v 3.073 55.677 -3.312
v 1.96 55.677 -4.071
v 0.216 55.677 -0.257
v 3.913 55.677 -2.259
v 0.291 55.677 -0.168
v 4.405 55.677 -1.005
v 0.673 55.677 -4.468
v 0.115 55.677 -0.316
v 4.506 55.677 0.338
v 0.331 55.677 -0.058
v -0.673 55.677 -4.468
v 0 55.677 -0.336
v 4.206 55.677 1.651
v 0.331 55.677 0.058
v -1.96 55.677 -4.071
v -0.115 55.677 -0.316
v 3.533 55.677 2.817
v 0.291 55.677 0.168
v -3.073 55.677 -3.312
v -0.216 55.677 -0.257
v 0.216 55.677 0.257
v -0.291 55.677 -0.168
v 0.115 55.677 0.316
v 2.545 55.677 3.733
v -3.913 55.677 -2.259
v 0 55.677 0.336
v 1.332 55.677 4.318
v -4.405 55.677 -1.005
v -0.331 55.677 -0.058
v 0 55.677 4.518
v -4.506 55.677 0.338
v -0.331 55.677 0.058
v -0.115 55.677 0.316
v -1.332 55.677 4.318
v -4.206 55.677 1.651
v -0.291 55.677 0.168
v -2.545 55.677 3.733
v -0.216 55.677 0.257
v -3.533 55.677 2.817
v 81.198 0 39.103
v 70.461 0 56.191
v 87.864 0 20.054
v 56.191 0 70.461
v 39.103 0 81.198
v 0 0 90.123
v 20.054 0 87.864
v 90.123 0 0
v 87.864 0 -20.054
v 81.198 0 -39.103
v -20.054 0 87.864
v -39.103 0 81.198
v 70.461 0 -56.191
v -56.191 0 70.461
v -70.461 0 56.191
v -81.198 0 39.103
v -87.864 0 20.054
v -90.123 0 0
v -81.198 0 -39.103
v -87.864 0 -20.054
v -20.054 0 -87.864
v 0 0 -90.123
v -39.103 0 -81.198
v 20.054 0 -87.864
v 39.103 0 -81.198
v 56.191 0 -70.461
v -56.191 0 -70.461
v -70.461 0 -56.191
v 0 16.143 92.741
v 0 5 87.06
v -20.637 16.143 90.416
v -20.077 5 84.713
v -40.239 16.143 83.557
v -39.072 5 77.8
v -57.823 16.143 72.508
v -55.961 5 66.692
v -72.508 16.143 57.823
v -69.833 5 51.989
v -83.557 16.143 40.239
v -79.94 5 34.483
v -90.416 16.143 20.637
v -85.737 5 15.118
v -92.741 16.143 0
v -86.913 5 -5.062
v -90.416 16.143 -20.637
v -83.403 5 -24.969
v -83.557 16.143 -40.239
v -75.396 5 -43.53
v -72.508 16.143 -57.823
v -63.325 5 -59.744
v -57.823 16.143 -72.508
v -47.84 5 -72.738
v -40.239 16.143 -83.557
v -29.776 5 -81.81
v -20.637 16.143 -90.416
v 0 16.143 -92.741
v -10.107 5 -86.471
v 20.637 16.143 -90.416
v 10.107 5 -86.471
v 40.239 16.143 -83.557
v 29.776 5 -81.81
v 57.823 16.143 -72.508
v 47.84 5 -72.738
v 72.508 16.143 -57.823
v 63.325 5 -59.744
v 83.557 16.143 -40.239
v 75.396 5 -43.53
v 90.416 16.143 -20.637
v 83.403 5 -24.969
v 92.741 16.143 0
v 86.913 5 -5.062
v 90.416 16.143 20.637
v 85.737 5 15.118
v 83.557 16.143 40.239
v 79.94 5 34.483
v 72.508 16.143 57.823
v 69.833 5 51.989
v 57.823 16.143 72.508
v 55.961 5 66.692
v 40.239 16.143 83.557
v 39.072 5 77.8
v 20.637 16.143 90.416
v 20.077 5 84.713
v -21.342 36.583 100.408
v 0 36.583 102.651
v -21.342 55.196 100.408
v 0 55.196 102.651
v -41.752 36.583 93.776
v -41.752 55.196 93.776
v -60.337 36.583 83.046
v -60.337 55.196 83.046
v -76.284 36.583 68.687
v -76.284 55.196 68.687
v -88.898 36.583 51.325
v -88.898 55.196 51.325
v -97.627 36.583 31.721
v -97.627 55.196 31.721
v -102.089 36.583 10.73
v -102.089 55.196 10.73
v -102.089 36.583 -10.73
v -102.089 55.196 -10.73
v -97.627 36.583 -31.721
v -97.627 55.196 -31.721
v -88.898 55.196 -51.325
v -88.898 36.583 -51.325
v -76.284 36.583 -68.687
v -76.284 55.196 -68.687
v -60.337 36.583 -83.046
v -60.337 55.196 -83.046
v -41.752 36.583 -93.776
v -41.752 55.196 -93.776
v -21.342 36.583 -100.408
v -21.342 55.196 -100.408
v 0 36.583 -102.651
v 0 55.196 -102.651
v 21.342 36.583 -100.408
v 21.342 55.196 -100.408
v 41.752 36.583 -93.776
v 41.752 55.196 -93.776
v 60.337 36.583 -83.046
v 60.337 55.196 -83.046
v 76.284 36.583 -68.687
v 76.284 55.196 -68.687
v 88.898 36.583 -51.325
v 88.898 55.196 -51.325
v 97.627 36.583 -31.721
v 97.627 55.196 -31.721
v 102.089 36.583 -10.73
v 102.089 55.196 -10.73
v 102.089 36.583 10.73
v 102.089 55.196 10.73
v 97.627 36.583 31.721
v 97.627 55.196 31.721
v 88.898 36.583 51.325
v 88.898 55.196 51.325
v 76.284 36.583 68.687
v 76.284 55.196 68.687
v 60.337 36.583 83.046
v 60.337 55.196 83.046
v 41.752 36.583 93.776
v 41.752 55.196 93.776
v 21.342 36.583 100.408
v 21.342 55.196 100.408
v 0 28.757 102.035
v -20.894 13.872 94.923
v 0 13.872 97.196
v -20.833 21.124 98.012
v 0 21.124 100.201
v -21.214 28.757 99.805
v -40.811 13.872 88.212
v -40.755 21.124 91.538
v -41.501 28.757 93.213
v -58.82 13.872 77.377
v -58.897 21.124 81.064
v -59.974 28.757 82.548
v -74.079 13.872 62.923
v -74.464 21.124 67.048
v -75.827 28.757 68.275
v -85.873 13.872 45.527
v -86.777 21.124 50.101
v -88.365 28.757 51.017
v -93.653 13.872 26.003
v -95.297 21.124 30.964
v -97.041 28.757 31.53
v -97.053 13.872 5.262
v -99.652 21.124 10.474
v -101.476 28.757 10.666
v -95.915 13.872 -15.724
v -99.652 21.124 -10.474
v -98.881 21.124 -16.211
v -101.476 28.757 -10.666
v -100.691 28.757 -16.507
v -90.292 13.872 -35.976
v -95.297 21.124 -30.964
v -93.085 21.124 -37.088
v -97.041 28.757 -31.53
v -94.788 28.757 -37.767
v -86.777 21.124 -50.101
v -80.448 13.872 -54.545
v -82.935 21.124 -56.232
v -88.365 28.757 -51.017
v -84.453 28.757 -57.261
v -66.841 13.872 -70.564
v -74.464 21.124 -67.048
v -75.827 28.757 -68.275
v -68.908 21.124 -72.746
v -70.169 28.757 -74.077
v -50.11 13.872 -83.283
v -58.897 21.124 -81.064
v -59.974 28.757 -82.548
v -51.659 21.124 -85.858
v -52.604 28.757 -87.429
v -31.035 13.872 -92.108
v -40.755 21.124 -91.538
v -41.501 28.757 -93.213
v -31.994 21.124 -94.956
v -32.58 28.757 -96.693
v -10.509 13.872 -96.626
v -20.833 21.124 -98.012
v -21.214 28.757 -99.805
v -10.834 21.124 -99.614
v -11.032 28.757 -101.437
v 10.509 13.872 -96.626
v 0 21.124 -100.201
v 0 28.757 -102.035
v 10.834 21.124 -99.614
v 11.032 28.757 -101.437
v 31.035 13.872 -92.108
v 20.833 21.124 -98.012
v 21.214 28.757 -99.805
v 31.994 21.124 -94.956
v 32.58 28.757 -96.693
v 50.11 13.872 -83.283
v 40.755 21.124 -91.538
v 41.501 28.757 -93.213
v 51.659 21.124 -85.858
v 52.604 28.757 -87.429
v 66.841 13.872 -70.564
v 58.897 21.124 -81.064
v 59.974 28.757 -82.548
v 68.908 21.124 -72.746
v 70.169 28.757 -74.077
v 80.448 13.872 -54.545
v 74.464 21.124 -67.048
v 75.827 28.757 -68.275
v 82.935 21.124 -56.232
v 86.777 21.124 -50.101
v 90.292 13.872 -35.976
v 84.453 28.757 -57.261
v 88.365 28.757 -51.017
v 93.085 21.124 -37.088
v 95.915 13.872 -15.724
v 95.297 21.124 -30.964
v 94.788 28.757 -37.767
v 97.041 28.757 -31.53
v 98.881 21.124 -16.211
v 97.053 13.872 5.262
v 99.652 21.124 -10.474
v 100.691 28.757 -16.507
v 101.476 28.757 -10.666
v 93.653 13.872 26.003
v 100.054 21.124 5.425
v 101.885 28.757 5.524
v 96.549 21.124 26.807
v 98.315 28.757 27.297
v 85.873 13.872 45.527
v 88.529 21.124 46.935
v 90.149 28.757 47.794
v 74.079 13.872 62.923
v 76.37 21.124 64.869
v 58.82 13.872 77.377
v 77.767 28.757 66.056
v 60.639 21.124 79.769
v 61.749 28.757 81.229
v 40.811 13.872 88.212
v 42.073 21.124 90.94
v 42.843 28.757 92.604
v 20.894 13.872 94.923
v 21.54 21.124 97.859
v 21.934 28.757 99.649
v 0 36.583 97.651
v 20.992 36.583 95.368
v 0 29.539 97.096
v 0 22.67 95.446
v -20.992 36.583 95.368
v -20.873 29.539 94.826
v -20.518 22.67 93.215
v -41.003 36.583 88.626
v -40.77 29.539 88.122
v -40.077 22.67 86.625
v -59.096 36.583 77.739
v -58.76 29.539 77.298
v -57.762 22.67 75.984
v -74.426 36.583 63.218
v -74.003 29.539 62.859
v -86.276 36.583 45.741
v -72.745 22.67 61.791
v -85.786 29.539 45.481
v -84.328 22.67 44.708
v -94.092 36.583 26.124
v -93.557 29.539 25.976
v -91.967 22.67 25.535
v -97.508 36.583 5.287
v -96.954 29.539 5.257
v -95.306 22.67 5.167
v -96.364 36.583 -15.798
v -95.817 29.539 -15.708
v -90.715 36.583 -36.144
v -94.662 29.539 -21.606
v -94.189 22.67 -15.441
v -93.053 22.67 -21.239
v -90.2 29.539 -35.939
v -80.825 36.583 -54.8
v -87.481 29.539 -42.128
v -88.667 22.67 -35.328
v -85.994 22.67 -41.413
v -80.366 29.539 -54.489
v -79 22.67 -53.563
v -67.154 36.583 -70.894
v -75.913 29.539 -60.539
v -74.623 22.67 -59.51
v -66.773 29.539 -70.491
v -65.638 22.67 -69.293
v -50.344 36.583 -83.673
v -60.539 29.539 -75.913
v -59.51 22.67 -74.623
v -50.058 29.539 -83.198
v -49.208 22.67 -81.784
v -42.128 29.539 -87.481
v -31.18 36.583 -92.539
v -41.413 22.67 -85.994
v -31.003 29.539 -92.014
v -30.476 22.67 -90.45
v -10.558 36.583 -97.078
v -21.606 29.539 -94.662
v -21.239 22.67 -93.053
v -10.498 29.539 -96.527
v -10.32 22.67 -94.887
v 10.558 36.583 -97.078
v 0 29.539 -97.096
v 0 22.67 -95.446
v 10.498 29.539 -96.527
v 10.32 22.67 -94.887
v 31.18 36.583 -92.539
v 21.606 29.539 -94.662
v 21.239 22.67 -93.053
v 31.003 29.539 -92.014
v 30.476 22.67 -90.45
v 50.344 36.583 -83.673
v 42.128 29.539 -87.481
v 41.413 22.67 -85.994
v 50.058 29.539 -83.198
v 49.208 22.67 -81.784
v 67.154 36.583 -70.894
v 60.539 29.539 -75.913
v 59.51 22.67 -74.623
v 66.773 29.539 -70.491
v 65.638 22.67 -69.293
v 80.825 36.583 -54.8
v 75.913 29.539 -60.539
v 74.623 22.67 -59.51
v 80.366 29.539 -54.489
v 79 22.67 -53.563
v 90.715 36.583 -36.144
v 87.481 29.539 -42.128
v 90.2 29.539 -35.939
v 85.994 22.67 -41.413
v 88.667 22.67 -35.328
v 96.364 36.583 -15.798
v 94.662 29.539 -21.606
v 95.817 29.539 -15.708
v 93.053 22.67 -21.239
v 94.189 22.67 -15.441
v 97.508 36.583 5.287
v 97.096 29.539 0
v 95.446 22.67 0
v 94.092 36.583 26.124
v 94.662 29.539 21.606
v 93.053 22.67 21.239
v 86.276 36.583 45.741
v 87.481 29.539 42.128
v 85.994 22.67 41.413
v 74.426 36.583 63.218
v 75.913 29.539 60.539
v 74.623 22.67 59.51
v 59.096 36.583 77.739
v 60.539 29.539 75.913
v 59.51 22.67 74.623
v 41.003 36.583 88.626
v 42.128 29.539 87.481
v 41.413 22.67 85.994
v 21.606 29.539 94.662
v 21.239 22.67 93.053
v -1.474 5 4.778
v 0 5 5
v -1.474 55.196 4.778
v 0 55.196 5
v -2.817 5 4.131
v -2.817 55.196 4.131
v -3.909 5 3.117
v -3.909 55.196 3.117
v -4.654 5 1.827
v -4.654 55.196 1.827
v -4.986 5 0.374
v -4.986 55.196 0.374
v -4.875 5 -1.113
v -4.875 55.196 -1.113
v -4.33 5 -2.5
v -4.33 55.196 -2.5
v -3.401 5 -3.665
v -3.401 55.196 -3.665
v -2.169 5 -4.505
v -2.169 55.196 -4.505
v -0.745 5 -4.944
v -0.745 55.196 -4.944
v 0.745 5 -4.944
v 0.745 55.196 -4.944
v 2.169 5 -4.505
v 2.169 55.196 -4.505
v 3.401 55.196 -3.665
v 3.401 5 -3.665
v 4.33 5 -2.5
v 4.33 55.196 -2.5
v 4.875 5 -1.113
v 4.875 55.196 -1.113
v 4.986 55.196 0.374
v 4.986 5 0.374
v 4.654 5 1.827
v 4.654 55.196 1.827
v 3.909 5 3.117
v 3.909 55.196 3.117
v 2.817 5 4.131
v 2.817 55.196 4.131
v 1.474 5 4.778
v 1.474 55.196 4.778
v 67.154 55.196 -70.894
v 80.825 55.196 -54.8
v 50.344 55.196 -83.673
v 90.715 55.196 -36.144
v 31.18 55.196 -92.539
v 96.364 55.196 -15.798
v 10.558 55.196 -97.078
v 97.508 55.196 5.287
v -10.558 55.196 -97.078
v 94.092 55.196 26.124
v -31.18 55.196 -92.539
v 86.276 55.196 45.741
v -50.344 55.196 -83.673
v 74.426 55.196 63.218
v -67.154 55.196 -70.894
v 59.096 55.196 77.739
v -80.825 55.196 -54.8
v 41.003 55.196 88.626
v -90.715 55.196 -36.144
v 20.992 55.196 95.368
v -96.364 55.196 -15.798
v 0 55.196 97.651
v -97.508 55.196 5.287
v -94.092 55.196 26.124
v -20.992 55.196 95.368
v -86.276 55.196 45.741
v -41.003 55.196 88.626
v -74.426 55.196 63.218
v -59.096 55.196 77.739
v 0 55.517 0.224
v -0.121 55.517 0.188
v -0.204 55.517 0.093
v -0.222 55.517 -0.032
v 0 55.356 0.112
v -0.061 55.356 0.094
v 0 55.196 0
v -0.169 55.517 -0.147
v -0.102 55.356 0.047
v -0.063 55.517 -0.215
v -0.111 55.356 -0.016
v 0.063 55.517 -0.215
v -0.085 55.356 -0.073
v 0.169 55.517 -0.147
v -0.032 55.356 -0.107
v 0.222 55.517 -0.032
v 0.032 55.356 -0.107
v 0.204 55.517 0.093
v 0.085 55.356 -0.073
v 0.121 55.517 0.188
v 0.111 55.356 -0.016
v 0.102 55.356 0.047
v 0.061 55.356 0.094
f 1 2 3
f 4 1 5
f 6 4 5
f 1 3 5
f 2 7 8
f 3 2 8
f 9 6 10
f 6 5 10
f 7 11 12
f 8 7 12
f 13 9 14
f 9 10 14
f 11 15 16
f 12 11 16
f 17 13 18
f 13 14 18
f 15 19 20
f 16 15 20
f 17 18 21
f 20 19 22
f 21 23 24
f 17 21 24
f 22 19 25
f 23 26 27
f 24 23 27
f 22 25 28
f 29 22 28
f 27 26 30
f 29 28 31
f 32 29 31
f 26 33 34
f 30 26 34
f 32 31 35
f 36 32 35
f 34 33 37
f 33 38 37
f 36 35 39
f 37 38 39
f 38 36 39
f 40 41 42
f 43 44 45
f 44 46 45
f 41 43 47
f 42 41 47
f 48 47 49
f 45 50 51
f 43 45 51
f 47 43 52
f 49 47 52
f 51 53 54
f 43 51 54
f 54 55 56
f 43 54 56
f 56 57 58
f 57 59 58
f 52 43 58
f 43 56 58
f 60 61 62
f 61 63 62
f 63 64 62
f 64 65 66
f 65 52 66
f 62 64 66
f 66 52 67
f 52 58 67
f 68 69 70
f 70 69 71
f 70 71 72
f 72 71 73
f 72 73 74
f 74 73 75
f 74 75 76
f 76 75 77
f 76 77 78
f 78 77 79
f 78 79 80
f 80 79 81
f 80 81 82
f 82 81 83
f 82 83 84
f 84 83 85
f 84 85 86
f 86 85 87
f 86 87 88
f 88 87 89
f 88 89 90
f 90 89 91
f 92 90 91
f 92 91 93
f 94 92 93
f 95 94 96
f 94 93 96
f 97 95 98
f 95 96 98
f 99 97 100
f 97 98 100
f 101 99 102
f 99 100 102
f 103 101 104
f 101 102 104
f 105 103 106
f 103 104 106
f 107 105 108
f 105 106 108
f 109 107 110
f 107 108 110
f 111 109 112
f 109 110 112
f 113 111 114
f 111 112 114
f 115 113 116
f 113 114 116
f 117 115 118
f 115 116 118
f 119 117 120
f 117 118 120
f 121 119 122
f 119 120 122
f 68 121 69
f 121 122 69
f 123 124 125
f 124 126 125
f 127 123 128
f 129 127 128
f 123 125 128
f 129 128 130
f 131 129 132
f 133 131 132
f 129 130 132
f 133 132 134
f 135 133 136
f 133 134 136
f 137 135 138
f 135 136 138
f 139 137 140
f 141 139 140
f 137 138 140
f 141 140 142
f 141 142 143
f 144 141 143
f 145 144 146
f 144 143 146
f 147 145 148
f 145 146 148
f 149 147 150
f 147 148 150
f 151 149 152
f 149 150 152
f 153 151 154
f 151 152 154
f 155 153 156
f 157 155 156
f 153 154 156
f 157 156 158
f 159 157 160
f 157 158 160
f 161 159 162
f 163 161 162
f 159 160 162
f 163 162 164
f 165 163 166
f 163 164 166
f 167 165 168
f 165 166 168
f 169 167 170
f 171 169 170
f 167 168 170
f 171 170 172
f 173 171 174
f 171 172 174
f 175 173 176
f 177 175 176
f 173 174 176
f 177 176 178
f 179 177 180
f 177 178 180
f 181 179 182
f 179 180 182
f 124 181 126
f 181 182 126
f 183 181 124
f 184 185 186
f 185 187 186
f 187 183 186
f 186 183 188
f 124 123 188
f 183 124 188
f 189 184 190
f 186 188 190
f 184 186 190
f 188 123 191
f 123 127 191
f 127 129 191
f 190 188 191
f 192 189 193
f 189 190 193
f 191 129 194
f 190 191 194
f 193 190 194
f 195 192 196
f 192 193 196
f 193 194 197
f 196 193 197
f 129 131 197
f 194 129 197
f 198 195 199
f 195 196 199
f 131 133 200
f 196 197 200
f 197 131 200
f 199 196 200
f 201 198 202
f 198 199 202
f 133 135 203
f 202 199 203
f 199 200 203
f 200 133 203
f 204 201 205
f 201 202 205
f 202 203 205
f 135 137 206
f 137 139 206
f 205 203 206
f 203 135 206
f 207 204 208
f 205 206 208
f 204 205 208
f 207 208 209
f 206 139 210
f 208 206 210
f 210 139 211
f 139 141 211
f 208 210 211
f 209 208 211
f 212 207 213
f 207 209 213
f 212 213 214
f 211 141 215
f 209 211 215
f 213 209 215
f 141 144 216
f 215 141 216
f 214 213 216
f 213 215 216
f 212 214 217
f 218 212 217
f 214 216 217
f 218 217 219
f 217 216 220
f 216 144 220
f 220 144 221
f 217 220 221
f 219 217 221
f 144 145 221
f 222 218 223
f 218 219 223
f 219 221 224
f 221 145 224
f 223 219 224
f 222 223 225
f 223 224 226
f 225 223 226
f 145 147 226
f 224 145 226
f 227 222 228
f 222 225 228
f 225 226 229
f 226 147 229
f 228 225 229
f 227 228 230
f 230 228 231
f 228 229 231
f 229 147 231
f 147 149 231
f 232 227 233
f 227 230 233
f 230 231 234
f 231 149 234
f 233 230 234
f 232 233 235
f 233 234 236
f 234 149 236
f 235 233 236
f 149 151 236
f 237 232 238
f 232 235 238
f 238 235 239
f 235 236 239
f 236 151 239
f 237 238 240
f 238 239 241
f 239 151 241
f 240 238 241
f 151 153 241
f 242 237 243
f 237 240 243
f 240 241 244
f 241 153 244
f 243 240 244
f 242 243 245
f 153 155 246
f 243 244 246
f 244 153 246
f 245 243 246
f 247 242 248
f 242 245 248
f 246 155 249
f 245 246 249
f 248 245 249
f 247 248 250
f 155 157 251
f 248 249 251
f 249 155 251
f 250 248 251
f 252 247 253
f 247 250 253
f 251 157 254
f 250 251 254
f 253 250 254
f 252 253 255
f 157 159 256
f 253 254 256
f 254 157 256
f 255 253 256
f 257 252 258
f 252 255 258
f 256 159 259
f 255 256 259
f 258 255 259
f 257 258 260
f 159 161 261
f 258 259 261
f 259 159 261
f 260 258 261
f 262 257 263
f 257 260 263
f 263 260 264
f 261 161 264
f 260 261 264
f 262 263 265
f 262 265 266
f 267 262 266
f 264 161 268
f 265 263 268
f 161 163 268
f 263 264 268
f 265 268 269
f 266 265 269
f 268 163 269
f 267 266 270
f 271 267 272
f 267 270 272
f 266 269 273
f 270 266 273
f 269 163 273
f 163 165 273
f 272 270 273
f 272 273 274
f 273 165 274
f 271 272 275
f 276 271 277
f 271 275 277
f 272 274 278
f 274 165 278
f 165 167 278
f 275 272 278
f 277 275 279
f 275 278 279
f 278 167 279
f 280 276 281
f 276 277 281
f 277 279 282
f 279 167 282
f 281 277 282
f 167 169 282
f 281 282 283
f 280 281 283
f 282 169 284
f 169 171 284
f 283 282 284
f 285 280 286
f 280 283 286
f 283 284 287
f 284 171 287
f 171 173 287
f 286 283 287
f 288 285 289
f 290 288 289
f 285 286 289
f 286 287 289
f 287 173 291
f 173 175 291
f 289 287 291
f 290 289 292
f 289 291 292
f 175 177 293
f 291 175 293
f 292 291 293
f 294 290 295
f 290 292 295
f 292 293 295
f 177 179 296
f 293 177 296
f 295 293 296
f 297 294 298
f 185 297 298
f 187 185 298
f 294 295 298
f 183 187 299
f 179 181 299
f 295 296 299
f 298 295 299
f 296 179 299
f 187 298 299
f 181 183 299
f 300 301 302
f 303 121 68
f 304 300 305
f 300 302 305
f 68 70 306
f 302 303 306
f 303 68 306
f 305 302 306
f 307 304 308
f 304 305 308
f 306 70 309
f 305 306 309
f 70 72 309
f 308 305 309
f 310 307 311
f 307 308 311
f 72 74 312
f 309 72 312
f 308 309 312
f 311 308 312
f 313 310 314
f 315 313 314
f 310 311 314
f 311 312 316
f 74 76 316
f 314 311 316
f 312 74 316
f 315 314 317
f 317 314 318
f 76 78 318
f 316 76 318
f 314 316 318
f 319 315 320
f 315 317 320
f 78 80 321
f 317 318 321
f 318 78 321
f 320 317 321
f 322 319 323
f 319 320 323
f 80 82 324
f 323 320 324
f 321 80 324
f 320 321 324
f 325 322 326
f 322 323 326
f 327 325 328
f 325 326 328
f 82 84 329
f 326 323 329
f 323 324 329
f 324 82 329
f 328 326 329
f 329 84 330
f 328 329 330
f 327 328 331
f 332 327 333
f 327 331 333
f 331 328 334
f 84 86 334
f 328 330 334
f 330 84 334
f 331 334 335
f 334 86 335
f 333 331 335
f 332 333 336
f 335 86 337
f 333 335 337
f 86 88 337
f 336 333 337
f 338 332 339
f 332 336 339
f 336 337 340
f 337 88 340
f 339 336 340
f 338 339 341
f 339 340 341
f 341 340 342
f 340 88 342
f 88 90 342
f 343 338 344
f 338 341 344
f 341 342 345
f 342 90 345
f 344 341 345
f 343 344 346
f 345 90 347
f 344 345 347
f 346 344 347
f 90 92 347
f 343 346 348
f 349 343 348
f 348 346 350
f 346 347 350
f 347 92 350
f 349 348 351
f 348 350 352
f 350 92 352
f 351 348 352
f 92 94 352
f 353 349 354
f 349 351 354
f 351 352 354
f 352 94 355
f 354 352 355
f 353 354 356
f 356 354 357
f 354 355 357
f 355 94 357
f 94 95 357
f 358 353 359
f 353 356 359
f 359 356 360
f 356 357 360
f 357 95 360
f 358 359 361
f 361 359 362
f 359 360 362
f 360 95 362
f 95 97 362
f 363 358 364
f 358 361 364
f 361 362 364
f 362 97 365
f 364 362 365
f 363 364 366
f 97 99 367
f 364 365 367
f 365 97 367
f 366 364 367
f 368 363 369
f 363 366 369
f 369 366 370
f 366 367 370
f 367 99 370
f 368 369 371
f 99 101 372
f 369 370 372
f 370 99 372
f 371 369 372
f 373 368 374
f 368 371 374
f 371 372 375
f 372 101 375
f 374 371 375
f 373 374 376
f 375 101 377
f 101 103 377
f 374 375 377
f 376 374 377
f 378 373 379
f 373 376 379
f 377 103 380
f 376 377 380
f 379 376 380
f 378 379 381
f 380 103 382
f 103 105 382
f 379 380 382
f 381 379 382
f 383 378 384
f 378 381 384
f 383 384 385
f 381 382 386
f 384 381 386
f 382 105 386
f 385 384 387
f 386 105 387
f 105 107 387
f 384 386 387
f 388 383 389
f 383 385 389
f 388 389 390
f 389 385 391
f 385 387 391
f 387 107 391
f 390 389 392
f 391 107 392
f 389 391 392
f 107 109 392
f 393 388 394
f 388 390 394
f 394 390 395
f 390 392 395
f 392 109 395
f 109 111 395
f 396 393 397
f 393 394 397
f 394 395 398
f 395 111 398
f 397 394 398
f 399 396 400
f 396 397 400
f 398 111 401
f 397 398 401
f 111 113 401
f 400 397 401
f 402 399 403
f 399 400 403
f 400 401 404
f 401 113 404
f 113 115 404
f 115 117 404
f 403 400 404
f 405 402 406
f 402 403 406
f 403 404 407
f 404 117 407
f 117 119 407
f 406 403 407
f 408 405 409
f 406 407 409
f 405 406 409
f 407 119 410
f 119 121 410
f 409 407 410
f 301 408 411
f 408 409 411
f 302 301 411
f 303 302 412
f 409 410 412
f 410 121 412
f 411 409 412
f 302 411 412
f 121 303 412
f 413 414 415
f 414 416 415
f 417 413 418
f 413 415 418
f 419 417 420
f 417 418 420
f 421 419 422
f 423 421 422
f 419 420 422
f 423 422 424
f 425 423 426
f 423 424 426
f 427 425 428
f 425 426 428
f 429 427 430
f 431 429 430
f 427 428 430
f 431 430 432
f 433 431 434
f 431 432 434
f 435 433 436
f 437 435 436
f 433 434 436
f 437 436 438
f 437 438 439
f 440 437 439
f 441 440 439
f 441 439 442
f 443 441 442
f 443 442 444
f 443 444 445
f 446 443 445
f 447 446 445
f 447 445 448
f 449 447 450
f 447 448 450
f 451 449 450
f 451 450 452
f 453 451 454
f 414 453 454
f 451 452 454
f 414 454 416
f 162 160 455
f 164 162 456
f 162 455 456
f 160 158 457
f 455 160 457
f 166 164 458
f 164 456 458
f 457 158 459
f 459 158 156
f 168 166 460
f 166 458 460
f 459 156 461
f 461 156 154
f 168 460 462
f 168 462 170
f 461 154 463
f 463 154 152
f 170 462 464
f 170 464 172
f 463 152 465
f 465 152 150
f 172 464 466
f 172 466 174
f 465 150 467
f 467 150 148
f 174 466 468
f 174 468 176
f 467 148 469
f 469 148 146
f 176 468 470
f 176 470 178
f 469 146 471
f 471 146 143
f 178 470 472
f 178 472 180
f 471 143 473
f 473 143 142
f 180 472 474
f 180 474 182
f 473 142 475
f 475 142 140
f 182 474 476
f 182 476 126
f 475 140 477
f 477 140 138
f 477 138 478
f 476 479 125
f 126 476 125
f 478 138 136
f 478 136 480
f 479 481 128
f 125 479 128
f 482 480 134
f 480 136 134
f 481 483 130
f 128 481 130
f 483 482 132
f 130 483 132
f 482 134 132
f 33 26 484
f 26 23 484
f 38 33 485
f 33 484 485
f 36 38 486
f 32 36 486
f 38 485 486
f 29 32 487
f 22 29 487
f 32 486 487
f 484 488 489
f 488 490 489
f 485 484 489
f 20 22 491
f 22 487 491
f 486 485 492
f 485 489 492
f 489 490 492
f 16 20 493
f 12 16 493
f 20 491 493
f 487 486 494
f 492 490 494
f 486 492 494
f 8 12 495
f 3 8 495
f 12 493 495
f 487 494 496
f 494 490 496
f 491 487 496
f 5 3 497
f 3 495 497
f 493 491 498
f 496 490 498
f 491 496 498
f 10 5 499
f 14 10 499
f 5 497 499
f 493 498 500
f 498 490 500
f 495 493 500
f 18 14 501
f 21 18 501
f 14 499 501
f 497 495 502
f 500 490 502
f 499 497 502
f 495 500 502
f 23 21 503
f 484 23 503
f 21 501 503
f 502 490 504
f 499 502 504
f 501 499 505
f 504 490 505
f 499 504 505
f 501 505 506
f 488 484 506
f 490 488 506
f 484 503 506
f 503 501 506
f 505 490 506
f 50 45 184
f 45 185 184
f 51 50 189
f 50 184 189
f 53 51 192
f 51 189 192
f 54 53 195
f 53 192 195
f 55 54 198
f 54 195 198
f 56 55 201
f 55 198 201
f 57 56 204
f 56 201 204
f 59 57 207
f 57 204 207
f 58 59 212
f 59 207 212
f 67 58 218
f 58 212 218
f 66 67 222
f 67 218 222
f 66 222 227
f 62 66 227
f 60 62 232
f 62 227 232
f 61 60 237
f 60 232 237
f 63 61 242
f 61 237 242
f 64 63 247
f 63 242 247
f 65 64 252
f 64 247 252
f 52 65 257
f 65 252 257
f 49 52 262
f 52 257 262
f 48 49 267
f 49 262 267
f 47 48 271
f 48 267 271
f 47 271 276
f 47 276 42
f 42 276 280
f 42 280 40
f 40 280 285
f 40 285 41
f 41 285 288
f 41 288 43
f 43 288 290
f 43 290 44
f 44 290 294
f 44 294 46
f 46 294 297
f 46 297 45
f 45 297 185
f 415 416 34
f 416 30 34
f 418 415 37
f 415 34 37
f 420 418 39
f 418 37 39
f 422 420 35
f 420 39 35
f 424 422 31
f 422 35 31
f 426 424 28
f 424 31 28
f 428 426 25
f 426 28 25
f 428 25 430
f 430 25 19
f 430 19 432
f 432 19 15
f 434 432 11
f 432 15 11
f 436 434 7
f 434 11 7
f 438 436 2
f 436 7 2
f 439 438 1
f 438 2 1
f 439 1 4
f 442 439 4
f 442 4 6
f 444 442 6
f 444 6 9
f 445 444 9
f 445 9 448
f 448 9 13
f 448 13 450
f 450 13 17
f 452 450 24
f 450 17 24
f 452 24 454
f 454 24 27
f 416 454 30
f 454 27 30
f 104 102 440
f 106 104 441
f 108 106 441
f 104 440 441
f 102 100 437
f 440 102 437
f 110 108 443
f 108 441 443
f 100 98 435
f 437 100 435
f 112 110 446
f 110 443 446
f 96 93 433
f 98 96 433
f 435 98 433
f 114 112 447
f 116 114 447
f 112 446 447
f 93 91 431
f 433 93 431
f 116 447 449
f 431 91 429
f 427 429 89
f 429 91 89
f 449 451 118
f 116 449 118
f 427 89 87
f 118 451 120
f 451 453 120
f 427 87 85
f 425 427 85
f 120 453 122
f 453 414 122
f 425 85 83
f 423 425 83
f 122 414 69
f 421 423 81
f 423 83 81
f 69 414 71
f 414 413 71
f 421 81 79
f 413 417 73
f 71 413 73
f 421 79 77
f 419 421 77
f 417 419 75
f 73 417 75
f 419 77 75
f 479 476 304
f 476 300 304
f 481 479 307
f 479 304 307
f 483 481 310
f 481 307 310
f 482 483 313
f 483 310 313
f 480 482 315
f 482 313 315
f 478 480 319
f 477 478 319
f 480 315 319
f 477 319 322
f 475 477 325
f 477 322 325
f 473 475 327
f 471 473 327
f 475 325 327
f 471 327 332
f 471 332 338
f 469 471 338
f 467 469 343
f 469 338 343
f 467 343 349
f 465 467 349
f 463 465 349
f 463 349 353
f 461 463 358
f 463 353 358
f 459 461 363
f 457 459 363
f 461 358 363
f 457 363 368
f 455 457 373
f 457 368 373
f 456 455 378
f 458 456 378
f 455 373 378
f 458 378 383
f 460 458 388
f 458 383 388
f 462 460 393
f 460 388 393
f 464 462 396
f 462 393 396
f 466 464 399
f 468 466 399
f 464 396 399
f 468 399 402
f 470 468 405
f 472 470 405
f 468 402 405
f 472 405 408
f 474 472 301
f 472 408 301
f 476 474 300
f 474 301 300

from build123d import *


with BuildPart() as part:
    # Croquis3 → Revolución3 (revolve)
    with BuildSketch(Plane.XY, mode=Mode.PRIVATE) as revoluci_n3_sk:
        with BuildLine():
            Line((0, 0), (90.123101889, 0))
            Line((90.123101889, 0), (97.195601882, 13.872079708))
            ThreePointArc((97.195601882, 13.872079708), (101.267943582, 24.904342215), (102.650891411, 36.582622834))
            Line((102.650891411, 36.582622834), (102.650891411, 55.195630425))
            Line((102.650891411, 55.195630425), (97.650891411, 55.195630425))
            Line((97.650891411, 55.195630425), (97.650891411, 36.582622834))
            ThreePointArc((97.650891411, 36.582622834), (96.406238365, 26.072170277), (92.741130835, 16.143134021))
            Line((92.741130835, 16.143134021), (87.059948421, 5))
            Line((87.059948421, 5), (5, 5))
            Line((5, 5), (5, 55.195630425))
            Line((5, 55.195630425), (4.518270437, 55.677359988))
            Line((4.518270437, 55.677359988), (0.335866273, 55.677359988))
            Line((0.335866273, 55.677359988), (0, 55.195630425))
            Line((0, 55.195630425), (0, 0))
        make_face()
    revolve(revoluci_n3_sk.sketch.rotate(Axis((0, 55.195630425, 0), (0, -1, 0)), 90), axis=Axis((0, 55.195630425, 0), (0, -1, 0)))


solid = part.part
